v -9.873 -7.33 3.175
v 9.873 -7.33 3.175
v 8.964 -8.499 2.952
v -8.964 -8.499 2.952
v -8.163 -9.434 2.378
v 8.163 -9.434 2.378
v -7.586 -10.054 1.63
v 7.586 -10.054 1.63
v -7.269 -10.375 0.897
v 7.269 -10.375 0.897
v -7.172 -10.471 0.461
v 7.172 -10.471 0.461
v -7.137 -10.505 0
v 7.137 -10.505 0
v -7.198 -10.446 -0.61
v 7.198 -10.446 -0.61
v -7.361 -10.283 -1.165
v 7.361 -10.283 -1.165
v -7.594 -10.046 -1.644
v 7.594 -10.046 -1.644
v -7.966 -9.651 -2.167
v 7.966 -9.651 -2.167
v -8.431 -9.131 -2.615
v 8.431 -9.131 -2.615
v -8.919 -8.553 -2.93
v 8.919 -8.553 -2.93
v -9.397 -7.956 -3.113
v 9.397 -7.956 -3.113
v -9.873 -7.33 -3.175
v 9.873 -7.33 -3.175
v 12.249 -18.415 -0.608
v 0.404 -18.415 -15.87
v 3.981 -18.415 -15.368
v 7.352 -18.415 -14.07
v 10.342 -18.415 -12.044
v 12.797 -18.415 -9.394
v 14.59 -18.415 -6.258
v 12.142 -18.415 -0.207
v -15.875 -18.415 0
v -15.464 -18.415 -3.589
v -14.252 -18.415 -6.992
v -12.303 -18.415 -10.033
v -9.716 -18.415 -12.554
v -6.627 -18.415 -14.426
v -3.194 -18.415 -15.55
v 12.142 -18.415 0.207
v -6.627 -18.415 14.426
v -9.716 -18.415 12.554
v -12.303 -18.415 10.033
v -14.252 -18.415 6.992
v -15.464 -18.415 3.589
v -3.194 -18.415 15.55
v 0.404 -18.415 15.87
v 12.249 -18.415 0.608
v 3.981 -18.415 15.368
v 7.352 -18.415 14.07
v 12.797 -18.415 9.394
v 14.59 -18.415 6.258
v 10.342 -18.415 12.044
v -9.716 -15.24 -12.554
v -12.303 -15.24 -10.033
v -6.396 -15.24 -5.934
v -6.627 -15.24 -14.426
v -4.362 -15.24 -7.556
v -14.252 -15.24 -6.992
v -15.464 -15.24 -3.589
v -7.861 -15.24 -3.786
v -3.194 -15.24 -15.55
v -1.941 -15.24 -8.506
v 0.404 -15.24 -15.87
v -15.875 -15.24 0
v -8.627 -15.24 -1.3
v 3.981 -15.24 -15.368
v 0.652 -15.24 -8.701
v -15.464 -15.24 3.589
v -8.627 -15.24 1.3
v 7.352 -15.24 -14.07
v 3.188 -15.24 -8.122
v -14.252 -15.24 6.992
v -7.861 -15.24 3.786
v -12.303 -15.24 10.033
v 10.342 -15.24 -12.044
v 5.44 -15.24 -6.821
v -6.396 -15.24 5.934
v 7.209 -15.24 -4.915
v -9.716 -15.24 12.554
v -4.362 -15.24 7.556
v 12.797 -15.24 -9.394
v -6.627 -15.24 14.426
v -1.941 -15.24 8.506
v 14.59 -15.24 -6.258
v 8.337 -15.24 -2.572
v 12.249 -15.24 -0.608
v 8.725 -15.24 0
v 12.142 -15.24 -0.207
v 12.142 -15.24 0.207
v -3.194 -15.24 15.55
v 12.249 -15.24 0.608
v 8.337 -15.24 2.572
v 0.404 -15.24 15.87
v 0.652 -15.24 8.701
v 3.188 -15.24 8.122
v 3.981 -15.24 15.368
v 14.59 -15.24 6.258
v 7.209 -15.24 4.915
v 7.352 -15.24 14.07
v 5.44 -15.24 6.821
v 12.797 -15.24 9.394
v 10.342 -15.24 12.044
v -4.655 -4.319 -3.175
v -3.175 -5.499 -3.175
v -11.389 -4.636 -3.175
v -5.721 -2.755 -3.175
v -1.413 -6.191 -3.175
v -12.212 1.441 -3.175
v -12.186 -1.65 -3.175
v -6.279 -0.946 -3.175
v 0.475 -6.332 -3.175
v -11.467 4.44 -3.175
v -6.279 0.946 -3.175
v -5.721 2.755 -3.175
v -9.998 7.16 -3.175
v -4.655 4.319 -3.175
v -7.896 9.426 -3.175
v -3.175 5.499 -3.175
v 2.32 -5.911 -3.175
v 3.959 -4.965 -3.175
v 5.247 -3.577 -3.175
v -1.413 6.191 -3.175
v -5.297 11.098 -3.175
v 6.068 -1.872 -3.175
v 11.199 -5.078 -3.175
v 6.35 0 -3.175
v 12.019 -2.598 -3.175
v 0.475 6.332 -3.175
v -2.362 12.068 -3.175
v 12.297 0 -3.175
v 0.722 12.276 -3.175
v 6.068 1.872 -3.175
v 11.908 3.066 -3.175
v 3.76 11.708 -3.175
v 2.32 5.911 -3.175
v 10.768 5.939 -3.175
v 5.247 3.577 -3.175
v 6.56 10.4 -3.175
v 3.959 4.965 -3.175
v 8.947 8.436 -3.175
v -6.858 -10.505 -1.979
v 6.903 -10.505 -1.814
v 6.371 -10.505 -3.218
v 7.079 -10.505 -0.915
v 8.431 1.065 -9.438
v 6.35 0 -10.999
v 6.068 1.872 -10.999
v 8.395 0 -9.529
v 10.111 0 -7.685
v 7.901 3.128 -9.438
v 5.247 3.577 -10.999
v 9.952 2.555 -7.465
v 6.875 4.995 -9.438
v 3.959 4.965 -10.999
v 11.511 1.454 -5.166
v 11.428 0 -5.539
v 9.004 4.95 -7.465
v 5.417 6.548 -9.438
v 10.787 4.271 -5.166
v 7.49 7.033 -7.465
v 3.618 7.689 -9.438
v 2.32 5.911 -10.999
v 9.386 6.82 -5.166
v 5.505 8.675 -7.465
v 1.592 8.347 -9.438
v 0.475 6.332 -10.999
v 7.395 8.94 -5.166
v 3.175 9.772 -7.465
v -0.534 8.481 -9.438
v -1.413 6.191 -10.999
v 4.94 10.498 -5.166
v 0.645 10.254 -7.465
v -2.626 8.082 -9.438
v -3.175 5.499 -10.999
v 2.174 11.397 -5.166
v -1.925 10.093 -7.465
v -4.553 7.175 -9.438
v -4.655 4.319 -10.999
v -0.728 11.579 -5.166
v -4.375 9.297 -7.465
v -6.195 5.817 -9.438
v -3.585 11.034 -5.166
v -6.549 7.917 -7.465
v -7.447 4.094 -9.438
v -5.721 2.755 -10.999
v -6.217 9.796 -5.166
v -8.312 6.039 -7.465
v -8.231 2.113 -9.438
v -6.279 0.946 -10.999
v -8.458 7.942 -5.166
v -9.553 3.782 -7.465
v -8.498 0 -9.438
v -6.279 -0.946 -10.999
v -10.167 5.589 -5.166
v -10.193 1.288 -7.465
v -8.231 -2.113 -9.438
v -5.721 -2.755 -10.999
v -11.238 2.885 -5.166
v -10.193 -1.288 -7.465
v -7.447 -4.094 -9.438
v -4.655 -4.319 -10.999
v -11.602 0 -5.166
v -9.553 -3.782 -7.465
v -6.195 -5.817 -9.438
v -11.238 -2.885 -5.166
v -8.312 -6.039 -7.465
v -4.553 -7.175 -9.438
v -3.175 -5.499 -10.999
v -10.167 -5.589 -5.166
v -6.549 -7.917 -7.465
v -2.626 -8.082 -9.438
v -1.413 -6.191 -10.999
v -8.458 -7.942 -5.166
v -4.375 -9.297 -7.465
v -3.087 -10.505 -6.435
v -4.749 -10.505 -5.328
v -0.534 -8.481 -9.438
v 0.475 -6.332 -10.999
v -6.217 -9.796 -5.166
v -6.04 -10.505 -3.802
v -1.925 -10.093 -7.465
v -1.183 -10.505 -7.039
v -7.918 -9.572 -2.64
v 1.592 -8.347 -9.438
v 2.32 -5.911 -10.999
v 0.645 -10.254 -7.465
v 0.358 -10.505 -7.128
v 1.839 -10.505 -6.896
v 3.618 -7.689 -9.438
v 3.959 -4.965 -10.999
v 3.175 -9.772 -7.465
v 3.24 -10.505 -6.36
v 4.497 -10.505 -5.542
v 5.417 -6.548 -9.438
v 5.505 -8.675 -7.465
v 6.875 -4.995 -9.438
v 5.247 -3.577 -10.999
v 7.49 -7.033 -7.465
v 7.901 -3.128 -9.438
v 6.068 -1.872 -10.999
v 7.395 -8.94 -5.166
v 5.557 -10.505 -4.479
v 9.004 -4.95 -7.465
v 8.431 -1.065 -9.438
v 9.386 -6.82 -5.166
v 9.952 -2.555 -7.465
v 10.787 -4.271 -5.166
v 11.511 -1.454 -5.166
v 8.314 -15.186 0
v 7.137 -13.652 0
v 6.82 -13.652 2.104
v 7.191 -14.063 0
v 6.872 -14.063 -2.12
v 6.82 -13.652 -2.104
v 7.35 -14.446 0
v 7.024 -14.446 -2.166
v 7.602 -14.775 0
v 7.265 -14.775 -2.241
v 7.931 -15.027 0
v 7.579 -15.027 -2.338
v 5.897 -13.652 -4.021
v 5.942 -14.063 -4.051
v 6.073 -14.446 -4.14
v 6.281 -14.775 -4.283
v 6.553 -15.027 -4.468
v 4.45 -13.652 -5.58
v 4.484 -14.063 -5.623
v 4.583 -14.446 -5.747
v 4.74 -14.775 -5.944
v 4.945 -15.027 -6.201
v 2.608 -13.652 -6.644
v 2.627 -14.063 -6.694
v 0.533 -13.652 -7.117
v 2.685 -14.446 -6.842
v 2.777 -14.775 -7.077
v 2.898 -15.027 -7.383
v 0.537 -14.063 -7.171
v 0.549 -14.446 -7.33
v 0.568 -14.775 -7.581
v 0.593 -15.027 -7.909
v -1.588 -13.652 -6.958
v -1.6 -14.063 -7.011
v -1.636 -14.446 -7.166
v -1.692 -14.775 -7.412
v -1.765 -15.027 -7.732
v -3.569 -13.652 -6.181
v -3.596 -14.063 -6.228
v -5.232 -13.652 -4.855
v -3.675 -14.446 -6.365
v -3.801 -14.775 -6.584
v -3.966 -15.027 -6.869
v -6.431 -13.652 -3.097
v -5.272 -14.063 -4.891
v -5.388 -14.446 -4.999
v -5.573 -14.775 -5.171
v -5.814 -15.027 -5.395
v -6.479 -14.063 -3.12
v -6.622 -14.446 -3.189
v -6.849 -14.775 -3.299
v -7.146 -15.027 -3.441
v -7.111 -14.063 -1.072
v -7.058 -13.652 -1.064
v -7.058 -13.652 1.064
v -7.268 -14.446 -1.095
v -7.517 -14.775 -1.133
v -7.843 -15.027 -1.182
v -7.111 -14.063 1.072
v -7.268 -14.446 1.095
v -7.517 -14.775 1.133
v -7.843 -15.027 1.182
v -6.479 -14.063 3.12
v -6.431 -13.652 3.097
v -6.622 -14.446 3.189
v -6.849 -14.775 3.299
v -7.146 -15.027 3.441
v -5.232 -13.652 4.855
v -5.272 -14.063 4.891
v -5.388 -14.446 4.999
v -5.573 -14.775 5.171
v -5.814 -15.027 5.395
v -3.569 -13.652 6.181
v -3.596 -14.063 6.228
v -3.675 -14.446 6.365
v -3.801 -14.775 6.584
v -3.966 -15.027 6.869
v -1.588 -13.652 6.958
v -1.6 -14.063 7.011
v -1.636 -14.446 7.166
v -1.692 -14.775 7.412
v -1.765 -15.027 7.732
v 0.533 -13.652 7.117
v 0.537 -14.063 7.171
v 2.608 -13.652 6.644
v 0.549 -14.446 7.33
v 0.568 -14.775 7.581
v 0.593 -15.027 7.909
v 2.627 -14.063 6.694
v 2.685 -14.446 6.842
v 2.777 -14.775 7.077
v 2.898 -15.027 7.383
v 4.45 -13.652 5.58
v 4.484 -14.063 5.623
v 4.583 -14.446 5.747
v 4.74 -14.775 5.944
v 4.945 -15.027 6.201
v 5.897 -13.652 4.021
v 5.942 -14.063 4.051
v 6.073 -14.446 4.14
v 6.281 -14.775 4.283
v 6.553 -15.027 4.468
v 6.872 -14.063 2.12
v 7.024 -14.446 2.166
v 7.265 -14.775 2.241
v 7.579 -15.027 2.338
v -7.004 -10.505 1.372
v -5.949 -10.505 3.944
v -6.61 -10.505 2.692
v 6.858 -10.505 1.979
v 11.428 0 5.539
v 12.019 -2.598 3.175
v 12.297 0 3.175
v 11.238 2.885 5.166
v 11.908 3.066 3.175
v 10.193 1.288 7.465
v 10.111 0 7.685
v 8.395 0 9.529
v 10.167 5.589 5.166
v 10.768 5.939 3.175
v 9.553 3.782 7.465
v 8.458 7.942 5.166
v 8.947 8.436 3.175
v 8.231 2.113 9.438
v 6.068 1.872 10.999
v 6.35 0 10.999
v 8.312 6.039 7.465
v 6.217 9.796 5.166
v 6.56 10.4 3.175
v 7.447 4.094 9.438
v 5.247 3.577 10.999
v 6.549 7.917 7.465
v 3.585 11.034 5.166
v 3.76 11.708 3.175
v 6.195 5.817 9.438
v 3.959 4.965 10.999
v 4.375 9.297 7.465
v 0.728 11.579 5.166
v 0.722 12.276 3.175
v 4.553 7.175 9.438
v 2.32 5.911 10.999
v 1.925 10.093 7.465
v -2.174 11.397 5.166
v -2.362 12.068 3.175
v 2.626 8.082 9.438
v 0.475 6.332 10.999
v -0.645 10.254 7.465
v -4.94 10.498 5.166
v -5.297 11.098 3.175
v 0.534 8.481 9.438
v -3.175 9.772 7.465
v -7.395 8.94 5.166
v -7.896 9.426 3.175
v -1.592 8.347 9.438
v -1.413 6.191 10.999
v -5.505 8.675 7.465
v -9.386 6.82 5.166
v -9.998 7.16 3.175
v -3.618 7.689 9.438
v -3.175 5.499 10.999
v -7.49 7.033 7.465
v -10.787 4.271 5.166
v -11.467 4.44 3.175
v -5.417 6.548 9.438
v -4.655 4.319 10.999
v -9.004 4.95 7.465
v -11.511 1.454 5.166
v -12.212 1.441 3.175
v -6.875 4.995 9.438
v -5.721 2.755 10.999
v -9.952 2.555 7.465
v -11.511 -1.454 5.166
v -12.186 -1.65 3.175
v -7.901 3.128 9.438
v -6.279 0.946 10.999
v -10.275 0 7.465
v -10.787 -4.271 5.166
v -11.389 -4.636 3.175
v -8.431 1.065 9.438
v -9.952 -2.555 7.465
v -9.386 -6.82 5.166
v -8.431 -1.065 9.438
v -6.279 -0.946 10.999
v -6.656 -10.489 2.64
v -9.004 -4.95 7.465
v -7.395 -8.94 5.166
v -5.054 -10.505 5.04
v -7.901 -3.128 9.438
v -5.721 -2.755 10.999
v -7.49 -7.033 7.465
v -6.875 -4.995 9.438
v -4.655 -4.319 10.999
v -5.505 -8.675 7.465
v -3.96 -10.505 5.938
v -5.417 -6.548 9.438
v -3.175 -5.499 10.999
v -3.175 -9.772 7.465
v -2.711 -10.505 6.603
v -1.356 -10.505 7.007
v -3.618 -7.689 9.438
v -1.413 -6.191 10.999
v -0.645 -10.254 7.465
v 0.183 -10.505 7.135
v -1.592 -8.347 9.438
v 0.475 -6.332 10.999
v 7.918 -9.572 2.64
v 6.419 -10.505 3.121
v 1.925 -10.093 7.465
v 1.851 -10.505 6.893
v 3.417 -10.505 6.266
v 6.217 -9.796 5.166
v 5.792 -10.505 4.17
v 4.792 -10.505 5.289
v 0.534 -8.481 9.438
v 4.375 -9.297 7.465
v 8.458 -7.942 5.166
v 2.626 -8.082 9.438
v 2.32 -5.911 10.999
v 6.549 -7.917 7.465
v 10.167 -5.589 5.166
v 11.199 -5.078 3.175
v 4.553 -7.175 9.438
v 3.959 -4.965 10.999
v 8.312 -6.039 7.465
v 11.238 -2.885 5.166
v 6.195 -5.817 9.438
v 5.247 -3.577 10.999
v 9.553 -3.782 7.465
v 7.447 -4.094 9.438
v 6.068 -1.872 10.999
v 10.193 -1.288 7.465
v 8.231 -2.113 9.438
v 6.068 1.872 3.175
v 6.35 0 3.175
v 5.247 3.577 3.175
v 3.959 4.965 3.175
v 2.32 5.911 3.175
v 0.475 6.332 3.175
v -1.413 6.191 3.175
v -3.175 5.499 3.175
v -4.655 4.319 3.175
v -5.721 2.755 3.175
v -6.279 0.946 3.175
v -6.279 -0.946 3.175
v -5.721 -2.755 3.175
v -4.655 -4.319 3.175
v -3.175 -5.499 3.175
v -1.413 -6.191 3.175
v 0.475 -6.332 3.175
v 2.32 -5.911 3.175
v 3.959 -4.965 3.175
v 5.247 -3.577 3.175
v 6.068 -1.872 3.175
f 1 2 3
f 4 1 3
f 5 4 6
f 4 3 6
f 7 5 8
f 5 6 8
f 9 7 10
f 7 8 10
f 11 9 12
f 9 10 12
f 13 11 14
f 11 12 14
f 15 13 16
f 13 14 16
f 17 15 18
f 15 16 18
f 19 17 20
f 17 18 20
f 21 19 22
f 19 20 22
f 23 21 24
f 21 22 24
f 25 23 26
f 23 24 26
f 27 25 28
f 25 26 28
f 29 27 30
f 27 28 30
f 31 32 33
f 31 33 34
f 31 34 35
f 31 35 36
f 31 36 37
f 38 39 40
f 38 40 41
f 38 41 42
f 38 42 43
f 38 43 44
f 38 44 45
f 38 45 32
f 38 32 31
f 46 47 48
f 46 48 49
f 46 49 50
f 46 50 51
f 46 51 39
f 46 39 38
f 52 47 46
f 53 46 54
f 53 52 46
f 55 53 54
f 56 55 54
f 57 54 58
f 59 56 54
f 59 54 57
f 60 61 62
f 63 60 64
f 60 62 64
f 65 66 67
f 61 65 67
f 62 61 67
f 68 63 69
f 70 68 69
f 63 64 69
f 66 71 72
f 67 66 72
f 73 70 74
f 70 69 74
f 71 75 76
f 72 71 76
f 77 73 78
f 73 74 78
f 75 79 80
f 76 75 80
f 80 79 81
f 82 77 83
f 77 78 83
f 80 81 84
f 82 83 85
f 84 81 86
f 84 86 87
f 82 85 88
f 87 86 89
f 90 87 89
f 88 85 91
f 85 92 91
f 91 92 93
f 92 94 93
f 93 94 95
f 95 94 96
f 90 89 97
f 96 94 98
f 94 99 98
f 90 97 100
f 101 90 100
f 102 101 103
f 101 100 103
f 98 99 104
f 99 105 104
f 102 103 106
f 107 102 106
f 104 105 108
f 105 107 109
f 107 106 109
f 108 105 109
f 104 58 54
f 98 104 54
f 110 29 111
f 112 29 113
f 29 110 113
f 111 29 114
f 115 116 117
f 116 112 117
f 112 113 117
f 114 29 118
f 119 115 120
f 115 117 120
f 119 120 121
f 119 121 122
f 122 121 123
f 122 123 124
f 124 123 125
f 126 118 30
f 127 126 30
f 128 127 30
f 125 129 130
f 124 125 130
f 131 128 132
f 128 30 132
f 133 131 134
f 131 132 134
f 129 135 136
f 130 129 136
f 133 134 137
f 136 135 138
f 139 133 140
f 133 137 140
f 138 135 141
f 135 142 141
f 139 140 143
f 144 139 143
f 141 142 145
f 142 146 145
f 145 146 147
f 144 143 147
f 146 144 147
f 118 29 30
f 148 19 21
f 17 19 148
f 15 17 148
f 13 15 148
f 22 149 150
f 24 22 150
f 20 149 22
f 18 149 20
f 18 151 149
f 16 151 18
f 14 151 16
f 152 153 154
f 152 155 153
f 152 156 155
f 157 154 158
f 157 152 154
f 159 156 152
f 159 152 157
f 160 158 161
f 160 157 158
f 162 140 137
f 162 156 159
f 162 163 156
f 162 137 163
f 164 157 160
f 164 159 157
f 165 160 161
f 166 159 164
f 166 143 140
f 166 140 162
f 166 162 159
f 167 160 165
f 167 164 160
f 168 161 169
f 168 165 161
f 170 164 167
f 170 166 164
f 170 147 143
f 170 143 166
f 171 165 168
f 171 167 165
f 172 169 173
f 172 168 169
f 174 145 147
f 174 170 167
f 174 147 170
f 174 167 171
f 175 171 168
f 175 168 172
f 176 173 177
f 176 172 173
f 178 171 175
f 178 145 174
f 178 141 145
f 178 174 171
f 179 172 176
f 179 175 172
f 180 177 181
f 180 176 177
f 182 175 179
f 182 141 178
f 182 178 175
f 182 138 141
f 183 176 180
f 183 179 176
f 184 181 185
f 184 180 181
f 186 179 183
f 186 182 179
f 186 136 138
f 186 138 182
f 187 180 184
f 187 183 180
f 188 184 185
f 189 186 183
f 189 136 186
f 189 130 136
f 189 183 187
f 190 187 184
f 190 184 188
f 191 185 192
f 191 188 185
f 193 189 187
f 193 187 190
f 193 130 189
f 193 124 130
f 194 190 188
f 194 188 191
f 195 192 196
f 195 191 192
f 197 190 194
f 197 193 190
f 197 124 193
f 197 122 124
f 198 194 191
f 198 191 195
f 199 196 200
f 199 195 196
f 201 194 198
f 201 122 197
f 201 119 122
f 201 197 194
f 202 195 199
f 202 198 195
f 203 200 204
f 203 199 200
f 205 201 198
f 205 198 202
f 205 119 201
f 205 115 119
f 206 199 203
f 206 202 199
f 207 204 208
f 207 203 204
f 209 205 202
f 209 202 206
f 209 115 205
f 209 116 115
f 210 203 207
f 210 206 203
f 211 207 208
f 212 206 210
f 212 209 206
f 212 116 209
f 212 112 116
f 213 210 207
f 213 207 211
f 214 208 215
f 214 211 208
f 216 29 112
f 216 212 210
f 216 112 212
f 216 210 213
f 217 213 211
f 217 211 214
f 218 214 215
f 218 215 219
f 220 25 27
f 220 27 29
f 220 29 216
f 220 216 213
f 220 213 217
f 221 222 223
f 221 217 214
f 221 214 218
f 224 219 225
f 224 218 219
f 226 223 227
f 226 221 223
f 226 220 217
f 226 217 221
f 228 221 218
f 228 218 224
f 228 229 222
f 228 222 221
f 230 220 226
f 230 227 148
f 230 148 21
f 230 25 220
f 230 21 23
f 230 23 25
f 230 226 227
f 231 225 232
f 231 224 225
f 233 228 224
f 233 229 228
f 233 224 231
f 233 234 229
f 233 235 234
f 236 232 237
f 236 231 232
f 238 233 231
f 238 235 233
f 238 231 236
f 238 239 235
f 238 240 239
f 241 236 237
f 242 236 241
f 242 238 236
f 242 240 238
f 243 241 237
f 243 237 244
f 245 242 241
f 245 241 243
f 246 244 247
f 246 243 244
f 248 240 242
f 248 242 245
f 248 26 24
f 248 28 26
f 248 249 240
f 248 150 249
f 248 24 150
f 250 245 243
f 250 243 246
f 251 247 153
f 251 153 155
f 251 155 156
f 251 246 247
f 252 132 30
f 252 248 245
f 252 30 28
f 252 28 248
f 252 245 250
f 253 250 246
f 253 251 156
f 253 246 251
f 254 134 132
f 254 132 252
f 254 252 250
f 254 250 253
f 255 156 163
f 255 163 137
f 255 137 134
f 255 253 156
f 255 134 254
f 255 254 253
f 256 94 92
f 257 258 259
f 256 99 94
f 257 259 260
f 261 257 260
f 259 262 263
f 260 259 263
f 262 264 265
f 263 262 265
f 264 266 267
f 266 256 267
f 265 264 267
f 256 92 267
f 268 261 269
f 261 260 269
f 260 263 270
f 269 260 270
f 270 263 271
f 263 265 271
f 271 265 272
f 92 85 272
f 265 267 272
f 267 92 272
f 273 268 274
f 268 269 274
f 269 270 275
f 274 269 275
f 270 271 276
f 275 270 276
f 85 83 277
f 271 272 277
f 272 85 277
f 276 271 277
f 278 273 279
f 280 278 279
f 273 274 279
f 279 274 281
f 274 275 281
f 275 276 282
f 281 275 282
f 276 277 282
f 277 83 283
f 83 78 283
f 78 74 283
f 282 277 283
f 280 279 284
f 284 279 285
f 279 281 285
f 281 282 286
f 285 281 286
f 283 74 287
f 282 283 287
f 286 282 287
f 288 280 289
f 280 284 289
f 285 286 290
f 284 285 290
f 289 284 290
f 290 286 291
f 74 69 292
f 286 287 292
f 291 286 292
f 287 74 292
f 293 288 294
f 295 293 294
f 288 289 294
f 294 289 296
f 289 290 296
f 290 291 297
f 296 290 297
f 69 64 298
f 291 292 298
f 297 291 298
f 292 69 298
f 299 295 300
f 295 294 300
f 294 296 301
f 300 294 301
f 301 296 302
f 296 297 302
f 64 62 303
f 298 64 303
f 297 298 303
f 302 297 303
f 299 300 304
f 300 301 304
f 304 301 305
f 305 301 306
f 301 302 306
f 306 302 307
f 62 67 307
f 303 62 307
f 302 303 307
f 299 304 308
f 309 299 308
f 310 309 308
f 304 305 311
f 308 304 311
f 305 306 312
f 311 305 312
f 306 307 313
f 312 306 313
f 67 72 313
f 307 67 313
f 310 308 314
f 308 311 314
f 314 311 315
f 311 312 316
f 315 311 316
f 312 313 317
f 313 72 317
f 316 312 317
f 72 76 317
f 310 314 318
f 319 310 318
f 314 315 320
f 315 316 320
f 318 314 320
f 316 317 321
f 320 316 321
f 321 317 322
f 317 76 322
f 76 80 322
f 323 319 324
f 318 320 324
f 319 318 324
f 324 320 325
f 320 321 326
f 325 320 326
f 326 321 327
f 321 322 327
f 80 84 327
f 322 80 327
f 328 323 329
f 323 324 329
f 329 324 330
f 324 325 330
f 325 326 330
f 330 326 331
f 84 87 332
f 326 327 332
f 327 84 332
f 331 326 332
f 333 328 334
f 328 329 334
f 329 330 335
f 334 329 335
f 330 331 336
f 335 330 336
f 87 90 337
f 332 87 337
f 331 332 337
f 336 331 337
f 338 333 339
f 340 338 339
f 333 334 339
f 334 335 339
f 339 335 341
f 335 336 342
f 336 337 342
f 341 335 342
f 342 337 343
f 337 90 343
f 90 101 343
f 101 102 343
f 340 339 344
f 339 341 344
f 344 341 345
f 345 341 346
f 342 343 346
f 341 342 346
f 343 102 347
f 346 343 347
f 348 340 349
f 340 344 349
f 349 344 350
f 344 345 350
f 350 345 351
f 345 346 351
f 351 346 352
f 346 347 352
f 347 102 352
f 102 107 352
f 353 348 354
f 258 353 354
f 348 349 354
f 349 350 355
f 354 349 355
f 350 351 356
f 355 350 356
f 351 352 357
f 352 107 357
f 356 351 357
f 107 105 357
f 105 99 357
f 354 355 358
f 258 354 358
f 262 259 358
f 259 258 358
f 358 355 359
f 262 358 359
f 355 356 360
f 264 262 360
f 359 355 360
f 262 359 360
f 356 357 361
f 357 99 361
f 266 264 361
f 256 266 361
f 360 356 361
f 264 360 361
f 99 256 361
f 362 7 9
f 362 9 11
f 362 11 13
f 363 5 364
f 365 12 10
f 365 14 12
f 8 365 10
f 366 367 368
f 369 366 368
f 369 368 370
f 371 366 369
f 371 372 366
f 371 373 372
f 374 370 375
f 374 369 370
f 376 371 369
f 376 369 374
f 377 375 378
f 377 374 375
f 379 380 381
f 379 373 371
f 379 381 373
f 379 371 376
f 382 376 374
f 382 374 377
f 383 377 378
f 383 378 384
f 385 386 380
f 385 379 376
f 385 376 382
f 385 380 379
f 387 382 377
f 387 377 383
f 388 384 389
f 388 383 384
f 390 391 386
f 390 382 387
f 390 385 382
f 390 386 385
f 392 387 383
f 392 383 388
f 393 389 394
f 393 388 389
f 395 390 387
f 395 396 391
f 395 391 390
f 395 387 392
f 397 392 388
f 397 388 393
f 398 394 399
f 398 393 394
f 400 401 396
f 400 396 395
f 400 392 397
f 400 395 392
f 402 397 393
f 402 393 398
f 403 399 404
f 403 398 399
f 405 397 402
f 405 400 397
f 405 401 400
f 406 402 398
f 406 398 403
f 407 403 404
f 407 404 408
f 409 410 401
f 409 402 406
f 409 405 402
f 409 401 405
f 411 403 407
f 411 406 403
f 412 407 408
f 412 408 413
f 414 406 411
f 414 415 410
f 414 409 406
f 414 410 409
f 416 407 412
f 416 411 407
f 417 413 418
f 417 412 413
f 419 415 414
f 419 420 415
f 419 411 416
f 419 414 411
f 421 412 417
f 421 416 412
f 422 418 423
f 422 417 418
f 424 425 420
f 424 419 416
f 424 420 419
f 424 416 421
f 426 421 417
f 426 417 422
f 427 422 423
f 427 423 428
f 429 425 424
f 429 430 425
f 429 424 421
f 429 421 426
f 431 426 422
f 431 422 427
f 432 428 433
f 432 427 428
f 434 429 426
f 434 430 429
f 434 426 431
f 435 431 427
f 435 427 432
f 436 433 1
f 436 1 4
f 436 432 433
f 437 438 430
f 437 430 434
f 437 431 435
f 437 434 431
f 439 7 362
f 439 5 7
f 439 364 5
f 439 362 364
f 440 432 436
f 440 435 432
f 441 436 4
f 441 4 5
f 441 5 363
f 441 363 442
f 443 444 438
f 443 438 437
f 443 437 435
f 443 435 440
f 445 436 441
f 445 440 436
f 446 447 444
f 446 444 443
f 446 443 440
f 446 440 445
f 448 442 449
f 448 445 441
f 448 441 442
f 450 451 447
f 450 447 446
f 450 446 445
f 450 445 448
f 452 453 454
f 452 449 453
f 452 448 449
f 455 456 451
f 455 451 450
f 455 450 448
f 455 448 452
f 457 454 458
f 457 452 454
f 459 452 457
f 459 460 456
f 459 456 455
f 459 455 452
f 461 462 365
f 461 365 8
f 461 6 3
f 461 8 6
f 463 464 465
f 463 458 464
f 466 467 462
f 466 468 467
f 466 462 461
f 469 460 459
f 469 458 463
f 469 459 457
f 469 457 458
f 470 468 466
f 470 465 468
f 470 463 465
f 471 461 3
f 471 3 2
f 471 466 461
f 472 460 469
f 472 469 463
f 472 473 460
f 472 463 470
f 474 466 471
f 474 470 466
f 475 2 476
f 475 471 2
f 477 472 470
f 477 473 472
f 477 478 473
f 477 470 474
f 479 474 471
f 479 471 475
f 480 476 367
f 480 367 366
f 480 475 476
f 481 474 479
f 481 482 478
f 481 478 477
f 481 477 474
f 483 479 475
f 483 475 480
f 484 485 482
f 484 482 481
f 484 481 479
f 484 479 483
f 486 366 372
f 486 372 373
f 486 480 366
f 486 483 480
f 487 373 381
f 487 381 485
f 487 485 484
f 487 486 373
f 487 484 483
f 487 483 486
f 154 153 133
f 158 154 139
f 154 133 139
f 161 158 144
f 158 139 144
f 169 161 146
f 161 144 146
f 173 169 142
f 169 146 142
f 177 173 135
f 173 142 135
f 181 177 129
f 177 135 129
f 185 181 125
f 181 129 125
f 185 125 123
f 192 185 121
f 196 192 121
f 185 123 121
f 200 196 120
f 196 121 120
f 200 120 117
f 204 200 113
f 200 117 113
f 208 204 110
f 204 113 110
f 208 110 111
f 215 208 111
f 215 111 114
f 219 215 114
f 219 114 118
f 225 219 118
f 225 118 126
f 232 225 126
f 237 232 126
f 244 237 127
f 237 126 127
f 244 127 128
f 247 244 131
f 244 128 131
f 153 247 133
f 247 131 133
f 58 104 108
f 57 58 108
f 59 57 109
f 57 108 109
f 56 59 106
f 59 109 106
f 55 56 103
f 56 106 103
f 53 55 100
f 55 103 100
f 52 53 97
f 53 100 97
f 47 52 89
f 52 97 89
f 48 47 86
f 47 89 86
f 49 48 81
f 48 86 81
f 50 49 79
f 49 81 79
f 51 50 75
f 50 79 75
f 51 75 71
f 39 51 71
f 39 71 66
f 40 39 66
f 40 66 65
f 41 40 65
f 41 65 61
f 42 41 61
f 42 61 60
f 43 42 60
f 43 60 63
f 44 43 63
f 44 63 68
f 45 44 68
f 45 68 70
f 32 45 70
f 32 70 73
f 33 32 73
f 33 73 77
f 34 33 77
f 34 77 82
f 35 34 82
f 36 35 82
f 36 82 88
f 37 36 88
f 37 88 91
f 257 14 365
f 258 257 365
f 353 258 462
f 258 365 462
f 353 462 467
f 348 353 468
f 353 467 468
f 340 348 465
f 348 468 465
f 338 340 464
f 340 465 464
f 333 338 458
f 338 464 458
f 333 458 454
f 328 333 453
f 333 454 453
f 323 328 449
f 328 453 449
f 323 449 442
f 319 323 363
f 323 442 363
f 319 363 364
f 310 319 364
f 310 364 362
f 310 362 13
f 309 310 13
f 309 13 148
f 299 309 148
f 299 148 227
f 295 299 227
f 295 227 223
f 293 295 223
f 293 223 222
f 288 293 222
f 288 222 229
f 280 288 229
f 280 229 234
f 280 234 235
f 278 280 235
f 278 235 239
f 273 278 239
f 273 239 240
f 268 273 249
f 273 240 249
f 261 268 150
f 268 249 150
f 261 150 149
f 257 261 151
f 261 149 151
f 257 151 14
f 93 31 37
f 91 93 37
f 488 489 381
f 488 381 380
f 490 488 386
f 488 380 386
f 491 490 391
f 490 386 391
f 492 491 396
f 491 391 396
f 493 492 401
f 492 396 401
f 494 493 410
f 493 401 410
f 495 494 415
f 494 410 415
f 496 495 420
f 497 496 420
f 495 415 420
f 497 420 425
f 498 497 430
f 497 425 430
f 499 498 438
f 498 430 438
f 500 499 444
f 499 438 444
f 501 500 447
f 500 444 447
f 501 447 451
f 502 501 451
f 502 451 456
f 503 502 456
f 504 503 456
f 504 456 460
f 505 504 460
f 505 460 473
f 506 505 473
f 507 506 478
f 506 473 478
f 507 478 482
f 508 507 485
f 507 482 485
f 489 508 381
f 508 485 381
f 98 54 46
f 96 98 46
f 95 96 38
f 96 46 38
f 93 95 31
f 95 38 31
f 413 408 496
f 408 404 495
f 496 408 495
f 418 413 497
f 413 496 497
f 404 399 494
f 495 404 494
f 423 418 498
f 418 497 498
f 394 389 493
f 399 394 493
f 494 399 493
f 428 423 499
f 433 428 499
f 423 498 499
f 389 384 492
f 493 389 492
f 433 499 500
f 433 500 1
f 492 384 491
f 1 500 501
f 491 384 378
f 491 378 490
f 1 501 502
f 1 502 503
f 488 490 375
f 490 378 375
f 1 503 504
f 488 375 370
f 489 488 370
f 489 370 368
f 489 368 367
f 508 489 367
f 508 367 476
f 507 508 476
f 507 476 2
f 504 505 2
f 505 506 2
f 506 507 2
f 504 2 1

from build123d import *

# Parameters (mm, degrees)
F1_R      = 6.35
F2_DEPTH  = 12.7
F5_R      = 15.875
F6_DEPTH  = 3.175
F8_R      = 7.1374
F9_DEPTH  = 7.9502
F13_DEPTH = 25.4
F15_R     = 1.5875
F17_DEPTH = 3.175


with BuildPart() as f2:
    # F1 (on Top) → F2 (new body, symmetric)
    with BuildSketch(Plane.XY):
        Circle(F1_R)
    extrude(amount=F2_DEPTH, both=True)


with BuildPart() as f3:
    # F0 (on Front) → F3 (revolve)
    with BuildSketch(Plane.XZ):
        with BuildLine():
            Line((0, 12.7), (0, -12.7))
            ThreePointArc((0, -12.7), (12.7, 0), (0, 12.7))
        make_face()
    revolve(axis=Axis((0, 0, 0), (0, 0, 1)))

    # F4: cut F2
    add(f2.part, mode=Mode.SUBTRACT)


with BuildPart() as f6:
    # F5 (on Front) → F6 (new body)
    with BuildSketch(Plane.XZ):
        Circle(F5_R)
    extrude(amount=F6_DEPTH)


with BuildPart() as f6_1:
    # F7: moved
    add(f6.part.moved(Location((0, -15.24, 0))))


with BuildPart() as f9:
    # F8 (on face) → F9 (new body)
    with BuildSketch(Plane.XZ.offset(18.415)):
        Circle(F8_R)
    extrude(amount=F9_DEPTH)


with BuildPart() as f9_1:
    # F10: moved
    add(f9.part.moved(Location((0, 7.9502, 0))))


with BuildPart() as f3_1:
    add(f3.part)

    # F11: union F6, F9
    add(f6_1.part)
    add(f9_1.part)


with BuildPart() as f13:
    # F12 (on Right) → F13 (new body, symmetric)
    with BuildSketch(Plane.YZ):
        with BuildLine():
            Line((27.5953571579, 3.175), (-7.3296428421, 3.175))
            ThreePointArc((-7.3296428421, 3.175), (-10.5046428421, 0), (-7.3296428421, -3.175))
            Line((-7.3296428421, -3.175), (27.5953571579, -3.175))
            Line((27.5953571579, -3.175), (27.5953571579, 3.175))
        make_face()
    extrude(amount=F13_DEPTH, both=True)


with BuildPart() as f3_2:
    add(f3_1.part)

    # F14: cut F13
    add(f13.part, mode=Mode.SUBTRACT)

    # F15
    f15_edges = [f3_2.edges().sort_by_distance(p)[0] for p in [
        (-7.1374, -15.24, 0),
    ]]
    fillet(f15_edges, radius=F15_R)


with BuildPart() as f17:
    # F16 (on face) → F17 (new body, symmetric)
    with BuildSketch(Plane.XZ.offset(18.415)):
        with BuildLine():
            Line((17.810190469, 14.0325875707), (12.2493412421, 0.6075099489))
            ThreePointArc((12.2493412421, 0.6075099489), (12.1285, 0), (12.2493412421, -0.6075099489))
            Line((12.2493412421, -0.6075099489), (17.810190469, -14.0325875707))
            Line((17.810190469, -14.0325875707), (17.810190469, 14.0325875707))
        make_face()
    extrude(amount=F17_DEPTH, both=True)


with BuildPart() as f3_3:
    add(f3_2.part)

    # F18: cut F17
    add(f17.part, mode=Mode.SUBTRACT)


solid = f3_3.part
